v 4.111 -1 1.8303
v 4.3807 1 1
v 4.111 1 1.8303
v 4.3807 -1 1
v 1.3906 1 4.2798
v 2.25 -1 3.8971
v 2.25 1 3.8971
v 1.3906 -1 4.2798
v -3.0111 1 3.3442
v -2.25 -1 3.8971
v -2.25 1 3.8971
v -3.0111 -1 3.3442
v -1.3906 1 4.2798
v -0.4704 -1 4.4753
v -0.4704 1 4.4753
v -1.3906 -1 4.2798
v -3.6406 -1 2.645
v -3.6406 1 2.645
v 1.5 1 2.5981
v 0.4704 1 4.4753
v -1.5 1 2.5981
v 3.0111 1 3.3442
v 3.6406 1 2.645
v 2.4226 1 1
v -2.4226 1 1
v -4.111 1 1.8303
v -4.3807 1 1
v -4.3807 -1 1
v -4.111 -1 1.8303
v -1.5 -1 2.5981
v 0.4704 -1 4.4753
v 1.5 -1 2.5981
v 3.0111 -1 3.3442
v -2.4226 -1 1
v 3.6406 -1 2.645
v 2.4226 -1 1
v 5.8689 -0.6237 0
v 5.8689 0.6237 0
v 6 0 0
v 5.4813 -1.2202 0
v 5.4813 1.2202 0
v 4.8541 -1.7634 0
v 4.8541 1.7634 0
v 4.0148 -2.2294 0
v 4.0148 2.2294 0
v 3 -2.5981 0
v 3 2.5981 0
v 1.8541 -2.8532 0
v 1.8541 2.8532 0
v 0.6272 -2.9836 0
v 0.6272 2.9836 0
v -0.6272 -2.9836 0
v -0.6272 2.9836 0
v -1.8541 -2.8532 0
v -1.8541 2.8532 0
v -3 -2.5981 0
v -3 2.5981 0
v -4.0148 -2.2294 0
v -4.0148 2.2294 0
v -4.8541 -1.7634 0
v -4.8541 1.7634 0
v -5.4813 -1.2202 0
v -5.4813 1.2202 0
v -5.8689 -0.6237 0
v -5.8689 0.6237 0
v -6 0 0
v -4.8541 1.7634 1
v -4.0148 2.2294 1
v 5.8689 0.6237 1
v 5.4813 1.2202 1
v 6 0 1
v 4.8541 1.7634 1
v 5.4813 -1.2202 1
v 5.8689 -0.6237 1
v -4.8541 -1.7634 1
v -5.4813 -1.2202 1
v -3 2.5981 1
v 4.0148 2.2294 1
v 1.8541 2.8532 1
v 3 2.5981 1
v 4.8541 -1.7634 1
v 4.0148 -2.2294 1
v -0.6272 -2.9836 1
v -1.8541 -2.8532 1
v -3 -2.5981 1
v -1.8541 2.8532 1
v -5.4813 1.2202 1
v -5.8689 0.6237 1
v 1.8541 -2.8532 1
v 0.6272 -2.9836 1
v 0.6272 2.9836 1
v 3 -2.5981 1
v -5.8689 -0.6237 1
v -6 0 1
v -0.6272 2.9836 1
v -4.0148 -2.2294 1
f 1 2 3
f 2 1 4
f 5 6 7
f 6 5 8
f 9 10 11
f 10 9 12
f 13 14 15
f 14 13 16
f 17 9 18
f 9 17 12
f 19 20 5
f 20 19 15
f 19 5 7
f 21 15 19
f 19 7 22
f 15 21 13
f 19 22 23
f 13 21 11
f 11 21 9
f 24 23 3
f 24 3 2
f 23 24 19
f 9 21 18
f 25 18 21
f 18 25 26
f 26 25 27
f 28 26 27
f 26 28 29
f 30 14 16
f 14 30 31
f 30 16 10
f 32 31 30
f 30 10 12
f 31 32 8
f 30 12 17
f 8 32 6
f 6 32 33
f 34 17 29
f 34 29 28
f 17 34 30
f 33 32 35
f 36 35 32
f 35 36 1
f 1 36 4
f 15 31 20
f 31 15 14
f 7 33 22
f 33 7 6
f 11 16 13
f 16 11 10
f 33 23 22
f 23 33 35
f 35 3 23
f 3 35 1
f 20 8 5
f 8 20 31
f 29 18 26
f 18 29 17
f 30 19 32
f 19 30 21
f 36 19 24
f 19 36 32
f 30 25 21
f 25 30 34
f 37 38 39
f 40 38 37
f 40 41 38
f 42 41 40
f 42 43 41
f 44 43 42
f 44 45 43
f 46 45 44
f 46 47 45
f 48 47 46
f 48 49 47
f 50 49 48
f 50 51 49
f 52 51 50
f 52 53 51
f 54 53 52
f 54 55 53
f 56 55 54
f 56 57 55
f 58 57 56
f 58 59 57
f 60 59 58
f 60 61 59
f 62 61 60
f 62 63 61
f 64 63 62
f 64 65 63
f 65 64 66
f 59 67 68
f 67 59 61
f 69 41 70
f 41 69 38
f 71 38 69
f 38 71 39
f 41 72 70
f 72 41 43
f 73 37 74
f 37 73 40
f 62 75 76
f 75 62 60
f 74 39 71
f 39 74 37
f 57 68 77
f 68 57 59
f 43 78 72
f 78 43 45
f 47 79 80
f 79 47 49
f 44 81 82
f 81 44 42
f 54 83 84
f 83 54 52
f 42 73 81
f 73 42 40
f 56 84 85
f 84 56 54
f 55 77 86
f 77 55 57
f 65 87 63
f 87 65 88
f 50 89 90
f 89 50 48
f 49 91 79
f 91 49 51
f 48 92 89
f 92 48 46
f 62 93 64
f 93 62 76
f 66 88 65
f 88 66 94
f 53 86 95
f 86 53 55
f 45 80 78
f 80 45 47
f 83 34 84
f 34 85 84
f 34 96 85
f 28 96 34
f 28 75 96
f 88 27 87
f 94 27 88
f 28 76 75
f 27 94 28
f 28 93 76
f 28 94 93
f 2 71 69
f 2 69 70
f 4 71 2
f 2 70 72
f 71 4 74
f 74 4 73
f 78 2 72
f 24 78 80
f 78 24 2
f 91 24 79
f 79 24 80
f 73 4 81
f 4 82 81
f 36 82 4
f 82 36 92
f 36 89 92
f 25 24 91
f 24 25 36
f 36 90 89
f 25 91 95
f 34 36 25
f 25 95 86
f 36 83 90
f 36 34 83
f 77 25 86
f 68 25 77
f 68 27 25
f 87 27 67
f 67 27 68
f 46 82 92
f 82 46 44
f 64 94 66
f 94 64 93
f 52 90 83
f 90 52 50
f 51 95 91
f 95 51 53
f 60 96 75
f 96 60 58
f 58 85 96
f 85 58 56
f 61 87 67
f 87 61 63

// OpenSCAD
$fn=30;

module ziptie_flansch(h=0) {
	scale([2, 1, 1])
	if (h > 0) {
		cylinder(d=6, h=h);
	}

	translate([0,0,0])
	rotate([90, 0, 0])
	difference() {
		cylinder(d=9, h=2, center=true);
		cylinder(d=6, h=2.1, $fn=6, center=true);
		translate([-5, -10, -5]) cube([10, 10, 10]);
	}
}

ziptie_flansch(h=1);
